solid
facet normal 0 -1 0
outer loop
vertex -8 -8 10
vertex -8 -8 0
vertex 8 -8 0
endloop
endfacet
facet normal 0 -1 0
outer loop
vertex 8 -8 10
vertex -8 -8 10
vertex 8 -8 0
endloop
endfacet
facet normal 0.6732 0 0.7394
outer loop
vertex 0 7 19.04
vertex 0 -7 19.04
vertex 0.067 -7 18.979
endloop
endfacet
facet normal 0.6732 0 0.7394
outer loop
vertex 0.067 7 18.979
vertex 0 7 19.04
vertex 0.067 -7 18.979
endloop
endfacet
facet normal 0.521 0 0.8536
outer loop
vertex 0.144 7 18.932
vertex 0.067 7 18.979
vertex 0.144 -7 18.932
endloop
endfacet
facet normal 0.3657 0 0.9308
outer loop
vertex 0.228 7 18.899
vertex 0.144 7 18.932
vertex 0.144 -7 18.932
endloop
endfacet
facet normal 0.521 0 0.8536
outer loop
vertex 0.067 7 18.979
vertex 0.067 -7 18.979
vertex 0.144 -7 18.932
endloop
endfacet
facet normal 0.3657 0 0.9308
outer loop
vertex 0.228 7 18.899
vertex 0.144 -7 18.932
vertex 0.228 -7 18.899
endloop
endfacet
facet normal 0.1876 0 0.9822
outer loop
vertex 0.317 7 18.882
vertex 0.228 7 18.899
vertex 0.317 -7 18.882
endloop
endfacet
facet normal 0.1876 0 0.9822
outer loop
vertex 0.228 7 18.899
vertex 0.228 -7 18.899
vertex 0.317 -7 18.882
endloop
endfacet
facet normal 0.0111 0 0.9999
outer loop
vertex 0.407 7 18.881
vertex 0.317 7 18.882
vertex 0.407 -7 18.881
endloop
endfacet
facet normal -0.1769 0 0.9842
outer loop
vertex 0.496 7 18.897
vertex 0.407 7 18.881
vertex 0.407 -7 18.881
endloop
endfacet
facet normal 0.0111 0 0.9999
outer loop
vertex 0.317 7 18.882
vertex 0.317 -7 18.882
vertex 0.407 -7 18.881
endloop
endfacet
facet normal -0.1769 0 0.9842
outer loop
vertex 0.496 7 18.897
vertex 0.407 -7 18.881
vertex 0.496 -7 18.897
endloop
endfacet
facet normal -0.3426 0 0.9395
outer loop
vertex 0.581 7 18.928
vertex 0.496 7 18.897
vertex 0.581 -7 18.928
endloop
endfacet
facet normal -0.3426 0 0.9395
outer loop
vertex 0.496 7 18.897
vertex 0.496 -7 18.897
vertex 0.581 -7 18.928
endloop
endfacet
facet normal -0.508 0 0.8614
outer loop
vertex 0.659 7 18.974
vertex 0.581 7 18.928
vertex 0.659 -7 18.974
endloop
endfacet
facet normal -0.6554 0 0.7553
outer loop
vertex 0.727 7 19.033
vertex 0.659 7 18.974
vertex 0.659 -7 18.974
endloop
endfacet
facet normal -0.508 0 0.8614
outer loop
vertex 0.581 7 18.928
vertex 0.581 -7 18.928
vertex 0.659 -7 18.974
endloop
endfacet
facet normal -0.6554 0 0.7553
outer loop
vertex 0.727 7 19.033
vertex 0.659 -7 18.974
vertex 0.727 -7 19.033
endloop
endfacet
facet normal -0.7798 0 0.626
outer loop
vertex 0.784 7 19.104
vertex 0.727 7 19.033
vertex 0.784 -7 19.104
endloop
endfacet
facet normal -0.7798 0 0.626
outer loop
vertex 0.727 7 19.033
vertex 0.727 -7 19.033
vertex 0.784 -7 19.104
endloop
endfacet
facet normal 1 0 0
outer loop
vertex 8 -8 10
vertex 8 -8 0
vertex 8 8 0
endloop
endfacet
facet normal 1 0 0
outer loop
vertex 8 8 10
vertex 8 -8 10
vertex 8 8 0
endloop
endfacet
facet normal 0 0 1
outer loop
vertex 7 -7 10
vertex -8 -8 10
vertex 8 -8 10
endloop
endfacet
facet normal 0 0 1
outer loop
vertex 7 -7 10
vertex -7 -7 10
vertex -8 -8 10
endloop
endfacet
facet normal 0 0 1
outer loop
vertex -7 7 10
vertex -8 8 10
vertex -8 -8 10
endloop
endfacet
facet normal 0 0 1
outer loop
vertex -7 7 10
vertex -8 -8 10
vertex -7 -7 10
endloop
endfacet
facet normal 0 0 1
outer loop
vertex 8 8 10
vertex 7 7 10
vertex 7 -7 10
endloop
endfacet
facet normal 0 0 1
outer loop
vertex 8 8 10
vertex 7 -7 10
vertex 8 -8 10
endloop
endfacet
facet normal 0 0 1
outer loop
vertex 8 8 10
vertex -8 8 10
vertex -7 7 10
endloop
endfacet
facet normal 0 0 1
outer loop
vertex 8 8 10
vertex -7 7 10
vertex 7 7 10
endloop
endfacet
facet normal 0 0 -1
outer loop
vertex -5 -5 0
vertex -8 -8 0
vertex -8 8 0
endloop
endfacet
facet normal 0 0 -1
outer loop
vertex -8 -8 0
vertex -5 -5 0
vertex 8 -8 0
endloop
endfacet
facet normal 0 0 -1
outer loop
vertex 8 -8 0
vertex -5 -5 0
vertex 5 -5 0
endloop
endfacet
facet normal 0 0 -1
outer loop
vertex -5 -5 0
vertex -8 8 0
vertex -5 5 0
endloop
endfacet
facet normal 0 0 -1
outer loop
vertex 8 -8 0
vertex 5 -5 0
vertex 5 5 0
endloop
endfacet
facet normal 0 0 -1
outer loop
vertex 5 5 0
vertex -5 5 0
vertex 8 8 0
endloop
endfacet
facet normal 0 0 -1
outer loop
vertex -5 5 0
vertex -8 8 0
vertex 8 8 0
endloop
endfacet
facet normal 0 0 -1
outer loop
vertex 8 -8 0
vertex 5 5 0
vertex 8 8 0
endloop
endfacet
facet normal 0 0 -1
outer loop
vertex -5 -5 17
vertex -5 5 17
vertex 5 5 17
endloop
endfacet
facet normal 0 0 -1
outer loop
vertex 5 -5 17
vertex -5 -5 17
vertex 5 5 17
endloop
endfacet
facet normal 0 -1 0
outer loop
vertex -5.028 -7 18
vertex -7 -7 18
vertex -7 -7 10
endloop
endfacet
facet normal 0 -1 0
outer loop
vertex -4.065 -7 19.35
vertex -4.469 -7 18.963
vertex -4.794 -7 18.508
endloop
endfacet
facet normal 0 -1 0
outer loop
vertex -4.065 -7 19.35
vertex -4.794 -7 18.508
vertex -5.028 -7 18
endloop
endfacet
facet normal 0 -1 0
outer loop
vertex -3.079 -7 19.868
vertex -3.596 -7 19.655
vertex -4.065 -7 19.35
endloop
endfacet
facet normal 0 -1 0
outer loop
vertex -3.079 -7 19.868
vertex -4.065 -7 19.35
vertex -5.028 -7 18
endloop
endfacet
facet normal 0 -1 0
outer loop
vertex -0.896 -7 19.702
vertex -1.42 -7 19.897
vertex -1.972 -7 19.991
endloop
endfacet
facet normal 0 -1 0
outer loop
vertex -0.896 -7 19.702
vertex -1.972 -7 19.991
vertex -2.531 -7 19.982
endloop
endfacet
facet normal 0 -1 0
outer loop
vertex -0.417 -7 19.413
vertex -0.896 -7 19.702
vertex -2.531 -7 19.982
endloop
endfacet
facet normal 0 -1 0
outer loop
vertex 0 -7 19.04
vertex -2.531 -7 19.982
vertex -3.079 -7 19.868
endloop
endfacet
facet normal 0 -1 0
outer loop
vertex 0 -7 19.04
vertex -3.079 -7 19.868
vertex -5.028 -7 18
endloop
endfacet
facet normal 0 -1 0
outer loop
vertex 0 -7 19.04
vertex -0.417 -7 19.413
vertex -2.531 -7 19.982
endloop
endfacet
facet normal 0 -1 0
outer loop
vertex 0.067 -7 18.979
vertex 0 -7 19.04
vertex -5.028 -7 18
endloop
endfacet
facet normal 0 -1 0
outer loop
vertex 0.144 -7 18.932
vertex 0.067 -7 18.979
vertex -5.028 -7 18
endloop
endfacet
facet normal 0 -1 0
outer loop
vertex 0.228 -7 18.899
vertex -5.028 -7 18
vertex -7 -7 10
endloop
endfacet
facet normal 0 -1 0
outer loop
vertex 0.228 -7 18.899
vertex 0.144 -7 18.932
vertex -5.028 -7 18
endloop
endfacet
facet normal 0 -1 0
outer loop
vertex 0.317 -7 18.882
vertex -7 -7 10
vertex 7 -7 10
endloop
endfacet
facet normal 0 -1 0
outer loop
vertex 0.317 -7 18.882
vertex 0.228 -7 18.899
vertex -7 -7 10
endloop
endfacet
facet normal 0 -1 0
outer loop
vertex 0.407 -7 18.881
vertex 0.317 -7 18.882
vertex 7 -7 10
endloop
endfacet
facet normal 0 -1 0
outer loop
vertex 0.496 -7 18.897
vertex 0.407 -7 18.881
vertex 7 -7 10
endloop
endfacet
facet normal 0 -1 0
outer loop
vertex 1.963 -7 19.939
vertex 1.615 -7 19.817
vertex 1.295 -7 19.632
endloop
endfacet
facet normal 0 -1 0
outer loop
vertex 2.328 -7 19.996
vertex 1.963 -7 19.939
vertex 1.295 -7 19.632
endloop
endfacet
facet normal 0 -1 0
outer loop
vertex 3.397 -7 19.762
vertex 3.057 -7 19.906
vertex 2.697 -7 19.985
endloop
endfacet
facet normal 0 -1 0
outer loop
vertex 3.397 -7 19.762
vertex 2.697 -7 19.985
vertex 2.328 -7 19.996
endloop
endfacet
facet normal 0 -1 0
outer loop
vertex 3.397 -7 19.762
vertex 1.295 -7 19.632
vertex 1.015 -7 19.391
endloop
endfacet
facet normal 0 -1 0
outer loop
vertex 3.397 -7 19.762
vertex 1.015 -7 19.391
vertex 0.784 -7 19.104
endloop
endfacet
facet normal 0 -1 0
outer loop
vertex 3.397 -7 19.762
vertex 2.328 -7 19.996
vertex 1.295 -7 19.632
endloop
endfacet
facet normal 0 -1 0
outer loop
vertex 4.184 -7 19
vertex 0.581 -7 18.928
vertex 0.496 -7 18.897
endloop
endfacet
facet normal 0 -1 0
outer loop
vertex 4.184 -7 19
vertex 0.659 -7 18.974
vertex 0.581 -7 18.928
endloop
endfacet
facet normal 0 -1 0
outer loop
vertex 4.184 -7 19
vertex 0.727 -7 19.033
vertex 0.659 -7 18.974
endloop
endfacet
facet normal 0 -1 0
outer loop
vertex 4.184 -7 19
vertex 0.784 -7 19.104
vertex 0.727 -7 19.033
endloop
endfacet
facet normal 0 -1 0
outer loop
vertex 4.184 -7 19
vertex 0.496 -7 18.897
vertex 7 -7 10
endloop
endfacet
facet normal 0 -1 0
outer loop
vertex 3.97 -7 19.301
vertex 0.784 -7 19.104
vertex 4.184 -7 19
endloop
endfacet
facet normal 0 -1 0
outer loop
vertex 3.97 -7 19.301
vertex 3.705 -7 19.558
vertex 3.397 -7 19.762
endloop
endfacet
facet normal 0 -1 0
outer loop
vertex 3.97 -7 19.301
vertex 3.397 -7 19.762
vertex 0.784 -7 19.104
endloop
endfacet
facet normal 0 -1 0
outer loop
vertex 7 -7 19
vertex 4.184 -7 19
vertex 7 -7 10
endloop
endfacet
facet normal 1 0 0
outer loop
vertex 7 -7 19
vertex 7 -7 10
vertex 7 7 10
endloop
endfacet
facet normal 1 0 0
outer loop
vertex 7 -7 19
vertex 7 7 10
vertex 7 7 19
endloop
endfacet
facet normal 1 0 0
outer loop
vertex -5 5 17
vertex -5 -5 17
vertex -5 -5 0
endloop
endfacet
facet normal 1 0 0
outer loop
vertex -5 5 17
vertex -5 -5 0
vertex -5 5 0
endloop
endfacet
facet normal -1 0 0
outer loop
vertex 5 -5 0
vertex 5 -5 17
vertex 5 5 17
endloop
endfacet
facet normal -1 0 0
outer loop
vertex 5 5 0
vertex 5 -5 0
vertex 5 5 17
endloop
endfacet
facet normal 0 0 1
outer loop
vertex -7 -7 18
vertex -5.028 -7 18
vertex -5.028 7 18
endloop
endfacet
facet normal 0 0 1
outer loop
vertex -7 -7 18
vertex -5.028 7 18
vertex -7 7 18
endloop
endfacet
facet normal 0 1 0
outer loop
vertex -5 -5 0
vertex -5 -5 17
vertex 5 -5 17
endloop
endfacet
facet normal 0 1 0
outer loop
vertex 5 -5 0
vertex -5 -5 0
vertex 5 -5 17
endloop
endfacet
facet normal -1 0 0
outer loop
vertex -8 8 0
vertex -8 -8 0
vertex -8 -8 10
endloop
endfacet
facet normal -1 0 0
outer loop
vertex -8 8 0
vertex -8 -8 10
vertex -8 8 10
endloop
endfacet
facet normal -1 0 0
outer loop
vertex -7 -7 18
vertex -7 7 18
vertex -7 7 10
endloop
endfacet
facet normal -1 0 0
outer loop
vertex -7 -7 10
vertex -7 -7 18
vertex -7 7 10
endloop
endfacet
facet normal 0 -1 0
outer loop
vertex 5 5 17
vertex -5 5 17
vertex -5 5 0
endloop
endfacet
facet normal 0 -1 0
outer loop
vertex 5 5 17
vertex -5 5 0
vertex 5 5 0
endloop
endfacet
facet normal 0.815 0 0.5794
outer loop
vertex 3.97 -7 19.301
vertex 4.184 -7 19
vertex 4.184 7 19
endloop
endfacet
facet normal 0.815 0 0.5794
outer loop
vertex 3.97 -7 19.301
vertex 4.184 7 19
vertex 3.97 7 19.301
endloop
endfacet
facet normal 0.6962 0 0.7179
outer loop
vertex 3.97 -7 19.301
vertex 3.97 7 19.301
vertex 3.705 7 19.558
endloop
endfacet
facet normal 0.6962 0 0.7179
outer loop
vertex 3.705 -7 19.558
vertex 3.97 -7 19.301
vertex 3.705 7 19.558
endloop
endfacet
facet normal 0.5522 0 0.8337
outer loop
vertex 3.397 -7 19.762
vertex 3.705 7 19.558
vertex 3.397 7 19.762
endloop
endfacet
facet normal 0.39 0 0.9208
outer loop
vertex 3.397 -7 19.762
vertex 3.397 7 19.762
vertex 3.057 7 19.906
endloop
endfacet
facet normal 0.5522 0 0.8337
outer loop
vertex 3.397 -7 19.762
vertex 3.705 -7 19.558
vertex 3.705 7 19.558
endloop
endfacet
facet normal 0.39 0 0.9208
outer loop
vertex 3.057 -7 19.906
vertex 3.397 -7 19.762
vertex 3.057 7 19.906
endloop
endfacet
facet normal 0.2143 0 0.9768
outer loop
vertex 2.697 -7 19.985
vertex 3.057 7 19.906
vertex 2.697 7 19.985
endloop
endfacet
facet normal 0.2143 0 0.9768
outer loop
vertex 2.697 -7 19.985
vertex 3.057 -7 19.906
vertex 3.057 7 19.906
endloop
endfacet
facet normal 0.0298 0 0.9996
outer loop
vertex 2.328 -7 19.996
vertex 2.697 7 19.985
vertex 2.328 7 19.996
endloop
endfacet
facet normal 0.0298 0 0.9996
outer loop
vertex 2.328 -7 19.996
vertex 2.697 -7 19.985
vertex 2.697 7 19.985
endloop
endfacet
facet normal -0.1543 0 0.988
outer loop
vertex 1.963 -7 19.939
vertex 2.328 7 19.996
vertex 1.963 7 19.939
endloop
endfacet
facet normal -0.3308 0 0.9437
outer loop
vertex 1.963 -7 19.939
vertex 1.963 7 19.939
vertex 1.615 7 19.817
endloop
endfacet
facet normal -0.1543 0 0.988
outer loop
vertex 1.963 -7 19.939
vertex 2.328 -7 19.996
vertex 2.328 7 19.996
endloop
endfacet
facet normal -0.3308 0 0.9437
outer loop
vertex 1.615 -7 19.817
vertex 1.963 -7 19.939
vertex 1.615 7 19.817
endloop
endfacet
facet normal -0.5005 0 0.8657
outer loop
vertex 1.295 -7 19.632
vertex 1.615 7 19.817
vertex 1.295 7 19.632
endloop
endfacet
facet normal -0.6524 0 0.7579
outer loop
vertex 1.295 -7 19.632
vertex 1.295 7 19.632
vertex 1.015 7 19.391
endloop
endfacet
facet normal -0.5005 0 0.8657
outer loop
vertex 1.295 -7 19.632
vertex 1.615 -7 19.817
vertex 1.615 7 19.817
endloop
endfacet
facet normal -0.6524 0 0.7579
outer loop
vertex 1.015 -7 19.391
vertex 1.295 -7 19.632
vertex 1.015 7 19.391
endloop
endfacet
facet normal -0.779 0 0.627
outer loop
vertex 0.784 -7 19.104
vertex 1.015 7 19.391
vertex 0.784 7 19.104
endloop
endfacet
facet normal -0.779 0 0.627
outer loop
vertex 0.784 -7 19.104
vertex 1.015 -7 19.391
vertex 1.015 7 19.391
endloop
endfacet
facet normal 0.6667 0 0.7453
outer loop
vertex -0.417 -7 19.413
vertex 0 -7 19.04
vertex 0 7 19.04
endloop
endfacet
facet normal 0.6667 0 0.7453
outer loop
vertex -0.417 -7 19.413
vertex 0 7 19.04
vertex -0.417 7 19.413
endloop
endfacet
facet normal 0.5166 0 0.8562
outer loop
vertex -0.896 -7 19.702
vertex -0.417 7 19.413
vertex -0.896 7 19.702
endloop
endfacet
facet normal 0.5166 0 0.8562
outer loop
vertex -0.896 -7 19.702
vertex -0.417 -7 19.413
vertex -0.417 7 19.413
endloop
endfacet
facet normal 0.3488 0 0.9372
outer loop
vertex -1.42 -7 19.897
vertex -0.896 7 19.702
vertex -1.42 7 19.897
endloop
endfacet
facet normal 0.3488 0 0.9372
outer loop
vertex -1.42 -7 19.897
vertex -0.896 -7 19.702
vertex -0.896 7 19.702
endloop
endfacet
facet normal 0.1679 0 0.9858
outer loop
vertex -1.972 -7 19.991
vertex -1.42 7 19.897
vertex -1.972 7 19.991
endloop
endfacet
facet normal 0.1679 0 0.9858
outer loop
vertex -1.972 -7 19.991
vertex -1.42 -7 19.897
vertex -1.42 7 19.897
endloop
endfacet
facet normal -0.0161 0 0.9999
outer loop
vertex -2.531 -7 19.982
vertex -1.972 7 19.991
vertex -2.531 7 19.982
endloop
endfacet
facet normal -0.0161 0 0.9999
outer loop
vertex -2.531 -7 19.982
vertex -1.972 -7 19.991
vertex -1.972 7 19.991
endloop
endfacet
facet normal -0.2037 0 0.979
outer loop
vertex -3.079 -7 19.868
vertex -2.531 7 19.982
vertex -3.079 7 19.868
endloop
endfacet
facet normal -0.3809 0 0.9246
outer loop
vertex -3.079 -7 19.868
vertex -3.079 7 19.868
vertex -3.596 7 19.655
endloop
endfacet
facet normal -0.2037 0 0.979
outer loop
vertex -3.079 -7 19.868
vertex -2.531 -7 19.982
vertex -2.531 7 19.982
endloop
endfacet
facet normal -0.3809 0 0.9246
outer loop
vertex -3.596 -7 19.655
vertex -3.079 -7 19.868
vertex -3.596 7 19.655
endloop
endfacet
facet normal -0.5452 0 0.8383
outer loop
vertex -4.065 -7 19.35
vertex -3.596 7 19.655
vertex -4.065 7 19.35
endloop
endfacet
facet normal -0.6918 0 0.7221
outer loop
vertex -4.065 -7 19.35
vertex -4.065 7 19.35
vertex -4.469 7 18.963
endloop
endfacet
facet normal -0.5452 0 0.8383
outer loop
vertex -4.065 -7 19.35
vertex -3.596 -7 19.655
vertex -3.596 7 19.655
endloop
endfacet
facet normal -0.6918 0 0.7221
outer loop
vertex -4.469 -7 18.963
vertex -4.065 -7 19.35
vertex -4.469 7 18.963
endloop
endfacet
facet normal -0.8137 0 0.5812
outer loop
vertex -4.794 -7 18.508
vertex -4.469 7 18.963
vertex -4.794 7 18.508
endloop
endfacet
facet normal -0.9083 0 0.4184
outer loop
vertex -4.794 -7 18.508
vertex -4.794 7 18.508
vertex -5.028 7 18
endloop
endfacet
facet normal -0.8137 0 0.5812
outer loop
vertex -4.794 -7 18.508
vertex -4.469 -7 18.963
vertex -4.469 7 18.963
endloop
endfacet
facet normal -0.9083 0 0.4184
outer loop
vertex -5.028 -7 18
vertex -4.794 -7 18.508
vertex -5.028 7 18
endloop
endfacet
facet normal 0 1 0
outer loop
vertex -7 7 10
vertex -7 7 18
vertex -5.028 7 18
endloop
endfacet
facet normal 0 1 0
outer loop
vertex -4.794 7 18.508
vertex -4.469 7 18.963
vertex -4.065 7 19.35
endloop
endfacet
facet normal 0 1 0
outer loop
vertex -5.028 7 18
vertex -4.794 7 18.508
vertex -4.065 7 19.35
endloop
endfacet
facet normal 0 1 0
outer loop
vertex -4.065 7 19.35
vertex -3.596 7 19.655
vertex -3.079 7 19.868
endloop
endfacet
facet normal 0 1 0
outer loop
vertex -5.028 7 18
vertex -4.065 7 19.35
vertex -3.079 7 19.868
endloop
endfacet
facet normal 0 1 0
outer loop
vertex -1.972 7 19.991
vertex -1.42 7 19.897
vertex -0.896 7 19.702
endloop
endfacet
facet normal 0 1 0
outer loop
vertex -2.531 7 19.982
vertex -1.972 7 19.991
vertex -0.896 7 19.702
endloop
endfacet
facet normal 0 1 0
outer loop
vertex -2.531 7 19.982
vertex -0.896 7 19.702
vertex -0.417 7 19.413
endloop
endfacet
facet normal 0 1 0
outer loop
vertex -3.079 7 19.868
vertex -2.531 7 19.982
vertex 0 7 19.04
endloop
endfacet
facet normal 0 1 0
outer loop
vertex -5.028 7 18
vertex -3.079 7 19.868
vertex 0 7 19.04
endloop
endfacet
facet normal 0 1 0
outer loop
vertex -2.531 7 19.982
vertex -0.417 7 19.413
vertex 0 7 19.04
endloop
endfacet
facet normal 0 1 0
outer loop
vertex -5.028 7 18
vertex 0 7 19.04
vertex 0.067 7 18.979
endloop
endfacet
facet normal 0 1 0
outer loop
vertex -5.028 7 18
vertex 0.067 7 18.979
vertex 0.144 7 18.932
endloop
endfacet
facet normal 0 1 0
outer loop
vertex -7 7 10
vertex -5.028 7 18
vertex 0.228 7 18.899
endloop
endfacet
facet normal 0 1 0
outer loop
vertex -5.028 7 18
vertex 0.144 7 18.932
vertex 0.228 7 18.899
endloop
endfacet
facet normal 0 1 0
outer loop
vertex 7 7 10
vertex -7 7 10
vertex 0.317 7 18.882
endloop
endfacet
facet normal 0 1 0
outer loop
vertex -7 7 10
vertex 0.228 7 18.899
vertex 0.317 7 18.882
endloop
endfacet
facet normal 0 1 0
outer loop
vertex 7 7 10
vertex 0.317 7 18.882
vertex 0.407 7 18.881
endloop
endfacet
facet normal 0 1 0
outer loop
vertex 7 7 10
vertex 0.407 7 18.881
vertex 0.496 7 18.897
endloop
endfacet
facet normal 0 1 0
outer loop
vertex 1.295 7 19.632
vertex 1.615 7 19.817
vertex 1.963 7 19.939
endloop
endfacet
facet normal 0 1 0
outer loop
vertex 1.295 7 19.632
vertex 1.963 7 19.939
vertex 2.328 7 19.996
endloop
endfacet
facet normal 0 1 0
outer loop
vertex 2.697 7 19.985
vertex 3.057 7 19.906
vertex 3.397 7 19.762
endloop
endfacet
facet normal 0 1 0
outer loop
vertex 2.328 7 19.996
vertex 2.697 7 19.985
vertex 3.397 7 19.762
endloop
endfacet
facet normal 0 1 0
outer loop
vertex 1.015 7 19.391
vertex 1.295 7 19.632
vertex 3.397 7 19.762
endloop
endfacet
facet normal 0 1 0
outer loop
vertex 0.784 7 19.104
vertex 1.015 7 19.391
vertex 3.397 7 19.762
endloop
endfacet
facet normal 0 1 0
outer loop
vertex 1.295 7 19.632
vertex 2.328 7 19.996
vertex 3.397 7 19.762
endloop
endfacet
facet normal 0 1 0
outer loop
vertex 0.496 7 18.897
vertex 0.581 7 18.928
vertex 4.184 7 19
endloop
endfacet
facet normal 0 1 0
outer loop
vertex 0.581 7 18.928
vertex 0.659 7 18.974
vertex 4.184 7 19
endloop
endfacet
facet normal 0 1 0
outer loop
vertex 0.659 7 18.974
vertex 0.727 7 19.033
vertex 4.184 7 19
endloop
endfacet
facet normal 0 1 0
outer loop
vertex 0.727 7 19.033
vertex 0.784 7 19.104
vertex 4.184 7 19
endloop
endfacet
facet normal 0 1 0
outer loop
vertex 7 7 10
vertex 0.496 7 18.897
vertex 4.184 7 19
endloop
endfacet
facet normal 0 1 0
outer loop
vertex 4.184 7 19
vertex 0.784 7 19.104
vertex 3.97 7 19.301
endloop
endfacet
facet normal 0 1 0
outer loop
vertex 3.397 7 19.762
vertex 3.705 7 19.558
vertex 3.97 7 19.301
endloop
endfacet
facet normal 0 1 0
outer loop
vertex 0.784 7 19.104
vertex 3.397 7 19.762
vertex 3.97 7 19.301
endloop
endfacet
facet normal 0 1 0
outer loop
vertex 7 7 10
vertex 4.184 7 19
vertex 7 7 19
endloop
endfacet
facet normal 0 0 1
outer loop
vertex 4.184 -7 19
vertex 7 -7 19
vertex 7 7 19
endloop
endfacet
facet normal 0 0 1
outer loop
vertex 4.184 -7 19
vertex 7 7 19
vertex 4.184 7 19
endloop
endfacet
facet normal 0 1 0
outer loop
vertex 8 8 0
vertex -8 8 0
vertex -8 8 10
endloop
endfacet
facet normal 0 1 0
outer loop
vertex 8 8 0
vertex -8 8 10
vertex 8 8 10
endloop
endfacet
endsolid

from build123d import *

# Parameters (mm, degrees)
BOX001_W      = 10
BOX001_H      = 10
BOX001_DEPTH  = 17
EXTRUDE_DEPTH = 14
BOX_W         = 16
BOX_H         = 16
BOX_DEPTH     = 10


with BuildPart() as cube001:
    # Box001 → Box001 (new body)
    with BuildSketch(Plane(origin=(-5, -5, 0), x_dir=(1, 0, 0), z_dir=(0, 0, 1))):
        with Locations((5, 5)):
            Rectangle(BOX001_W, BOX001_H)
    extrude(amount=BOX001_DEPTH)


with BuildPart() as extrude_body:
    # Sketch → Extrude (new body)
    with BuildSketch(Plane(origin=(-7, -7, 0), x_dir=(1, 0, 0), z_dir=(0, -1, 0))):
        with BuildLine():
            ThreePointArc((7, 19.039578), (4.192599, 19.937873), (1.971545, 18))
            Line((1.971545, 18), (0, 18))
            Line((0, 18), (0, 10))
            Line((0, 10), (14, 10))
            Line((14, 10), (14, 19))
            Line((14, 19), (11.183659, 19))
            ThreePointArc((11.183659, 19), (9.512524, 19.999072), (7.783659, 19.103606))
            ThreePointArc((7, 19.039578), (7.407388, 18.881168), (7.783659, 19.103606))
        make_face()
    extrude(amount=-EXTRUDE_DEPTH)


with BuildPart() as cut:
    # Box → Box (new body)
    with BuildSketch(Plane(origin=(-8, -8, 0), x_dir=(1, 0, 0), z_dir=(0, 0, 1))):
        with Locations((8, 8)):
            Rectangle(BOX_W, BOX_H)
    extrude(amount=BOX_DEPTH)

    # Fusion: union Extrude body
    add(extrude_body.part)

    # Cut: cut Cube001
    add(cube001.part, mode=Mode.SUBTRACT)


solid = cut.part
